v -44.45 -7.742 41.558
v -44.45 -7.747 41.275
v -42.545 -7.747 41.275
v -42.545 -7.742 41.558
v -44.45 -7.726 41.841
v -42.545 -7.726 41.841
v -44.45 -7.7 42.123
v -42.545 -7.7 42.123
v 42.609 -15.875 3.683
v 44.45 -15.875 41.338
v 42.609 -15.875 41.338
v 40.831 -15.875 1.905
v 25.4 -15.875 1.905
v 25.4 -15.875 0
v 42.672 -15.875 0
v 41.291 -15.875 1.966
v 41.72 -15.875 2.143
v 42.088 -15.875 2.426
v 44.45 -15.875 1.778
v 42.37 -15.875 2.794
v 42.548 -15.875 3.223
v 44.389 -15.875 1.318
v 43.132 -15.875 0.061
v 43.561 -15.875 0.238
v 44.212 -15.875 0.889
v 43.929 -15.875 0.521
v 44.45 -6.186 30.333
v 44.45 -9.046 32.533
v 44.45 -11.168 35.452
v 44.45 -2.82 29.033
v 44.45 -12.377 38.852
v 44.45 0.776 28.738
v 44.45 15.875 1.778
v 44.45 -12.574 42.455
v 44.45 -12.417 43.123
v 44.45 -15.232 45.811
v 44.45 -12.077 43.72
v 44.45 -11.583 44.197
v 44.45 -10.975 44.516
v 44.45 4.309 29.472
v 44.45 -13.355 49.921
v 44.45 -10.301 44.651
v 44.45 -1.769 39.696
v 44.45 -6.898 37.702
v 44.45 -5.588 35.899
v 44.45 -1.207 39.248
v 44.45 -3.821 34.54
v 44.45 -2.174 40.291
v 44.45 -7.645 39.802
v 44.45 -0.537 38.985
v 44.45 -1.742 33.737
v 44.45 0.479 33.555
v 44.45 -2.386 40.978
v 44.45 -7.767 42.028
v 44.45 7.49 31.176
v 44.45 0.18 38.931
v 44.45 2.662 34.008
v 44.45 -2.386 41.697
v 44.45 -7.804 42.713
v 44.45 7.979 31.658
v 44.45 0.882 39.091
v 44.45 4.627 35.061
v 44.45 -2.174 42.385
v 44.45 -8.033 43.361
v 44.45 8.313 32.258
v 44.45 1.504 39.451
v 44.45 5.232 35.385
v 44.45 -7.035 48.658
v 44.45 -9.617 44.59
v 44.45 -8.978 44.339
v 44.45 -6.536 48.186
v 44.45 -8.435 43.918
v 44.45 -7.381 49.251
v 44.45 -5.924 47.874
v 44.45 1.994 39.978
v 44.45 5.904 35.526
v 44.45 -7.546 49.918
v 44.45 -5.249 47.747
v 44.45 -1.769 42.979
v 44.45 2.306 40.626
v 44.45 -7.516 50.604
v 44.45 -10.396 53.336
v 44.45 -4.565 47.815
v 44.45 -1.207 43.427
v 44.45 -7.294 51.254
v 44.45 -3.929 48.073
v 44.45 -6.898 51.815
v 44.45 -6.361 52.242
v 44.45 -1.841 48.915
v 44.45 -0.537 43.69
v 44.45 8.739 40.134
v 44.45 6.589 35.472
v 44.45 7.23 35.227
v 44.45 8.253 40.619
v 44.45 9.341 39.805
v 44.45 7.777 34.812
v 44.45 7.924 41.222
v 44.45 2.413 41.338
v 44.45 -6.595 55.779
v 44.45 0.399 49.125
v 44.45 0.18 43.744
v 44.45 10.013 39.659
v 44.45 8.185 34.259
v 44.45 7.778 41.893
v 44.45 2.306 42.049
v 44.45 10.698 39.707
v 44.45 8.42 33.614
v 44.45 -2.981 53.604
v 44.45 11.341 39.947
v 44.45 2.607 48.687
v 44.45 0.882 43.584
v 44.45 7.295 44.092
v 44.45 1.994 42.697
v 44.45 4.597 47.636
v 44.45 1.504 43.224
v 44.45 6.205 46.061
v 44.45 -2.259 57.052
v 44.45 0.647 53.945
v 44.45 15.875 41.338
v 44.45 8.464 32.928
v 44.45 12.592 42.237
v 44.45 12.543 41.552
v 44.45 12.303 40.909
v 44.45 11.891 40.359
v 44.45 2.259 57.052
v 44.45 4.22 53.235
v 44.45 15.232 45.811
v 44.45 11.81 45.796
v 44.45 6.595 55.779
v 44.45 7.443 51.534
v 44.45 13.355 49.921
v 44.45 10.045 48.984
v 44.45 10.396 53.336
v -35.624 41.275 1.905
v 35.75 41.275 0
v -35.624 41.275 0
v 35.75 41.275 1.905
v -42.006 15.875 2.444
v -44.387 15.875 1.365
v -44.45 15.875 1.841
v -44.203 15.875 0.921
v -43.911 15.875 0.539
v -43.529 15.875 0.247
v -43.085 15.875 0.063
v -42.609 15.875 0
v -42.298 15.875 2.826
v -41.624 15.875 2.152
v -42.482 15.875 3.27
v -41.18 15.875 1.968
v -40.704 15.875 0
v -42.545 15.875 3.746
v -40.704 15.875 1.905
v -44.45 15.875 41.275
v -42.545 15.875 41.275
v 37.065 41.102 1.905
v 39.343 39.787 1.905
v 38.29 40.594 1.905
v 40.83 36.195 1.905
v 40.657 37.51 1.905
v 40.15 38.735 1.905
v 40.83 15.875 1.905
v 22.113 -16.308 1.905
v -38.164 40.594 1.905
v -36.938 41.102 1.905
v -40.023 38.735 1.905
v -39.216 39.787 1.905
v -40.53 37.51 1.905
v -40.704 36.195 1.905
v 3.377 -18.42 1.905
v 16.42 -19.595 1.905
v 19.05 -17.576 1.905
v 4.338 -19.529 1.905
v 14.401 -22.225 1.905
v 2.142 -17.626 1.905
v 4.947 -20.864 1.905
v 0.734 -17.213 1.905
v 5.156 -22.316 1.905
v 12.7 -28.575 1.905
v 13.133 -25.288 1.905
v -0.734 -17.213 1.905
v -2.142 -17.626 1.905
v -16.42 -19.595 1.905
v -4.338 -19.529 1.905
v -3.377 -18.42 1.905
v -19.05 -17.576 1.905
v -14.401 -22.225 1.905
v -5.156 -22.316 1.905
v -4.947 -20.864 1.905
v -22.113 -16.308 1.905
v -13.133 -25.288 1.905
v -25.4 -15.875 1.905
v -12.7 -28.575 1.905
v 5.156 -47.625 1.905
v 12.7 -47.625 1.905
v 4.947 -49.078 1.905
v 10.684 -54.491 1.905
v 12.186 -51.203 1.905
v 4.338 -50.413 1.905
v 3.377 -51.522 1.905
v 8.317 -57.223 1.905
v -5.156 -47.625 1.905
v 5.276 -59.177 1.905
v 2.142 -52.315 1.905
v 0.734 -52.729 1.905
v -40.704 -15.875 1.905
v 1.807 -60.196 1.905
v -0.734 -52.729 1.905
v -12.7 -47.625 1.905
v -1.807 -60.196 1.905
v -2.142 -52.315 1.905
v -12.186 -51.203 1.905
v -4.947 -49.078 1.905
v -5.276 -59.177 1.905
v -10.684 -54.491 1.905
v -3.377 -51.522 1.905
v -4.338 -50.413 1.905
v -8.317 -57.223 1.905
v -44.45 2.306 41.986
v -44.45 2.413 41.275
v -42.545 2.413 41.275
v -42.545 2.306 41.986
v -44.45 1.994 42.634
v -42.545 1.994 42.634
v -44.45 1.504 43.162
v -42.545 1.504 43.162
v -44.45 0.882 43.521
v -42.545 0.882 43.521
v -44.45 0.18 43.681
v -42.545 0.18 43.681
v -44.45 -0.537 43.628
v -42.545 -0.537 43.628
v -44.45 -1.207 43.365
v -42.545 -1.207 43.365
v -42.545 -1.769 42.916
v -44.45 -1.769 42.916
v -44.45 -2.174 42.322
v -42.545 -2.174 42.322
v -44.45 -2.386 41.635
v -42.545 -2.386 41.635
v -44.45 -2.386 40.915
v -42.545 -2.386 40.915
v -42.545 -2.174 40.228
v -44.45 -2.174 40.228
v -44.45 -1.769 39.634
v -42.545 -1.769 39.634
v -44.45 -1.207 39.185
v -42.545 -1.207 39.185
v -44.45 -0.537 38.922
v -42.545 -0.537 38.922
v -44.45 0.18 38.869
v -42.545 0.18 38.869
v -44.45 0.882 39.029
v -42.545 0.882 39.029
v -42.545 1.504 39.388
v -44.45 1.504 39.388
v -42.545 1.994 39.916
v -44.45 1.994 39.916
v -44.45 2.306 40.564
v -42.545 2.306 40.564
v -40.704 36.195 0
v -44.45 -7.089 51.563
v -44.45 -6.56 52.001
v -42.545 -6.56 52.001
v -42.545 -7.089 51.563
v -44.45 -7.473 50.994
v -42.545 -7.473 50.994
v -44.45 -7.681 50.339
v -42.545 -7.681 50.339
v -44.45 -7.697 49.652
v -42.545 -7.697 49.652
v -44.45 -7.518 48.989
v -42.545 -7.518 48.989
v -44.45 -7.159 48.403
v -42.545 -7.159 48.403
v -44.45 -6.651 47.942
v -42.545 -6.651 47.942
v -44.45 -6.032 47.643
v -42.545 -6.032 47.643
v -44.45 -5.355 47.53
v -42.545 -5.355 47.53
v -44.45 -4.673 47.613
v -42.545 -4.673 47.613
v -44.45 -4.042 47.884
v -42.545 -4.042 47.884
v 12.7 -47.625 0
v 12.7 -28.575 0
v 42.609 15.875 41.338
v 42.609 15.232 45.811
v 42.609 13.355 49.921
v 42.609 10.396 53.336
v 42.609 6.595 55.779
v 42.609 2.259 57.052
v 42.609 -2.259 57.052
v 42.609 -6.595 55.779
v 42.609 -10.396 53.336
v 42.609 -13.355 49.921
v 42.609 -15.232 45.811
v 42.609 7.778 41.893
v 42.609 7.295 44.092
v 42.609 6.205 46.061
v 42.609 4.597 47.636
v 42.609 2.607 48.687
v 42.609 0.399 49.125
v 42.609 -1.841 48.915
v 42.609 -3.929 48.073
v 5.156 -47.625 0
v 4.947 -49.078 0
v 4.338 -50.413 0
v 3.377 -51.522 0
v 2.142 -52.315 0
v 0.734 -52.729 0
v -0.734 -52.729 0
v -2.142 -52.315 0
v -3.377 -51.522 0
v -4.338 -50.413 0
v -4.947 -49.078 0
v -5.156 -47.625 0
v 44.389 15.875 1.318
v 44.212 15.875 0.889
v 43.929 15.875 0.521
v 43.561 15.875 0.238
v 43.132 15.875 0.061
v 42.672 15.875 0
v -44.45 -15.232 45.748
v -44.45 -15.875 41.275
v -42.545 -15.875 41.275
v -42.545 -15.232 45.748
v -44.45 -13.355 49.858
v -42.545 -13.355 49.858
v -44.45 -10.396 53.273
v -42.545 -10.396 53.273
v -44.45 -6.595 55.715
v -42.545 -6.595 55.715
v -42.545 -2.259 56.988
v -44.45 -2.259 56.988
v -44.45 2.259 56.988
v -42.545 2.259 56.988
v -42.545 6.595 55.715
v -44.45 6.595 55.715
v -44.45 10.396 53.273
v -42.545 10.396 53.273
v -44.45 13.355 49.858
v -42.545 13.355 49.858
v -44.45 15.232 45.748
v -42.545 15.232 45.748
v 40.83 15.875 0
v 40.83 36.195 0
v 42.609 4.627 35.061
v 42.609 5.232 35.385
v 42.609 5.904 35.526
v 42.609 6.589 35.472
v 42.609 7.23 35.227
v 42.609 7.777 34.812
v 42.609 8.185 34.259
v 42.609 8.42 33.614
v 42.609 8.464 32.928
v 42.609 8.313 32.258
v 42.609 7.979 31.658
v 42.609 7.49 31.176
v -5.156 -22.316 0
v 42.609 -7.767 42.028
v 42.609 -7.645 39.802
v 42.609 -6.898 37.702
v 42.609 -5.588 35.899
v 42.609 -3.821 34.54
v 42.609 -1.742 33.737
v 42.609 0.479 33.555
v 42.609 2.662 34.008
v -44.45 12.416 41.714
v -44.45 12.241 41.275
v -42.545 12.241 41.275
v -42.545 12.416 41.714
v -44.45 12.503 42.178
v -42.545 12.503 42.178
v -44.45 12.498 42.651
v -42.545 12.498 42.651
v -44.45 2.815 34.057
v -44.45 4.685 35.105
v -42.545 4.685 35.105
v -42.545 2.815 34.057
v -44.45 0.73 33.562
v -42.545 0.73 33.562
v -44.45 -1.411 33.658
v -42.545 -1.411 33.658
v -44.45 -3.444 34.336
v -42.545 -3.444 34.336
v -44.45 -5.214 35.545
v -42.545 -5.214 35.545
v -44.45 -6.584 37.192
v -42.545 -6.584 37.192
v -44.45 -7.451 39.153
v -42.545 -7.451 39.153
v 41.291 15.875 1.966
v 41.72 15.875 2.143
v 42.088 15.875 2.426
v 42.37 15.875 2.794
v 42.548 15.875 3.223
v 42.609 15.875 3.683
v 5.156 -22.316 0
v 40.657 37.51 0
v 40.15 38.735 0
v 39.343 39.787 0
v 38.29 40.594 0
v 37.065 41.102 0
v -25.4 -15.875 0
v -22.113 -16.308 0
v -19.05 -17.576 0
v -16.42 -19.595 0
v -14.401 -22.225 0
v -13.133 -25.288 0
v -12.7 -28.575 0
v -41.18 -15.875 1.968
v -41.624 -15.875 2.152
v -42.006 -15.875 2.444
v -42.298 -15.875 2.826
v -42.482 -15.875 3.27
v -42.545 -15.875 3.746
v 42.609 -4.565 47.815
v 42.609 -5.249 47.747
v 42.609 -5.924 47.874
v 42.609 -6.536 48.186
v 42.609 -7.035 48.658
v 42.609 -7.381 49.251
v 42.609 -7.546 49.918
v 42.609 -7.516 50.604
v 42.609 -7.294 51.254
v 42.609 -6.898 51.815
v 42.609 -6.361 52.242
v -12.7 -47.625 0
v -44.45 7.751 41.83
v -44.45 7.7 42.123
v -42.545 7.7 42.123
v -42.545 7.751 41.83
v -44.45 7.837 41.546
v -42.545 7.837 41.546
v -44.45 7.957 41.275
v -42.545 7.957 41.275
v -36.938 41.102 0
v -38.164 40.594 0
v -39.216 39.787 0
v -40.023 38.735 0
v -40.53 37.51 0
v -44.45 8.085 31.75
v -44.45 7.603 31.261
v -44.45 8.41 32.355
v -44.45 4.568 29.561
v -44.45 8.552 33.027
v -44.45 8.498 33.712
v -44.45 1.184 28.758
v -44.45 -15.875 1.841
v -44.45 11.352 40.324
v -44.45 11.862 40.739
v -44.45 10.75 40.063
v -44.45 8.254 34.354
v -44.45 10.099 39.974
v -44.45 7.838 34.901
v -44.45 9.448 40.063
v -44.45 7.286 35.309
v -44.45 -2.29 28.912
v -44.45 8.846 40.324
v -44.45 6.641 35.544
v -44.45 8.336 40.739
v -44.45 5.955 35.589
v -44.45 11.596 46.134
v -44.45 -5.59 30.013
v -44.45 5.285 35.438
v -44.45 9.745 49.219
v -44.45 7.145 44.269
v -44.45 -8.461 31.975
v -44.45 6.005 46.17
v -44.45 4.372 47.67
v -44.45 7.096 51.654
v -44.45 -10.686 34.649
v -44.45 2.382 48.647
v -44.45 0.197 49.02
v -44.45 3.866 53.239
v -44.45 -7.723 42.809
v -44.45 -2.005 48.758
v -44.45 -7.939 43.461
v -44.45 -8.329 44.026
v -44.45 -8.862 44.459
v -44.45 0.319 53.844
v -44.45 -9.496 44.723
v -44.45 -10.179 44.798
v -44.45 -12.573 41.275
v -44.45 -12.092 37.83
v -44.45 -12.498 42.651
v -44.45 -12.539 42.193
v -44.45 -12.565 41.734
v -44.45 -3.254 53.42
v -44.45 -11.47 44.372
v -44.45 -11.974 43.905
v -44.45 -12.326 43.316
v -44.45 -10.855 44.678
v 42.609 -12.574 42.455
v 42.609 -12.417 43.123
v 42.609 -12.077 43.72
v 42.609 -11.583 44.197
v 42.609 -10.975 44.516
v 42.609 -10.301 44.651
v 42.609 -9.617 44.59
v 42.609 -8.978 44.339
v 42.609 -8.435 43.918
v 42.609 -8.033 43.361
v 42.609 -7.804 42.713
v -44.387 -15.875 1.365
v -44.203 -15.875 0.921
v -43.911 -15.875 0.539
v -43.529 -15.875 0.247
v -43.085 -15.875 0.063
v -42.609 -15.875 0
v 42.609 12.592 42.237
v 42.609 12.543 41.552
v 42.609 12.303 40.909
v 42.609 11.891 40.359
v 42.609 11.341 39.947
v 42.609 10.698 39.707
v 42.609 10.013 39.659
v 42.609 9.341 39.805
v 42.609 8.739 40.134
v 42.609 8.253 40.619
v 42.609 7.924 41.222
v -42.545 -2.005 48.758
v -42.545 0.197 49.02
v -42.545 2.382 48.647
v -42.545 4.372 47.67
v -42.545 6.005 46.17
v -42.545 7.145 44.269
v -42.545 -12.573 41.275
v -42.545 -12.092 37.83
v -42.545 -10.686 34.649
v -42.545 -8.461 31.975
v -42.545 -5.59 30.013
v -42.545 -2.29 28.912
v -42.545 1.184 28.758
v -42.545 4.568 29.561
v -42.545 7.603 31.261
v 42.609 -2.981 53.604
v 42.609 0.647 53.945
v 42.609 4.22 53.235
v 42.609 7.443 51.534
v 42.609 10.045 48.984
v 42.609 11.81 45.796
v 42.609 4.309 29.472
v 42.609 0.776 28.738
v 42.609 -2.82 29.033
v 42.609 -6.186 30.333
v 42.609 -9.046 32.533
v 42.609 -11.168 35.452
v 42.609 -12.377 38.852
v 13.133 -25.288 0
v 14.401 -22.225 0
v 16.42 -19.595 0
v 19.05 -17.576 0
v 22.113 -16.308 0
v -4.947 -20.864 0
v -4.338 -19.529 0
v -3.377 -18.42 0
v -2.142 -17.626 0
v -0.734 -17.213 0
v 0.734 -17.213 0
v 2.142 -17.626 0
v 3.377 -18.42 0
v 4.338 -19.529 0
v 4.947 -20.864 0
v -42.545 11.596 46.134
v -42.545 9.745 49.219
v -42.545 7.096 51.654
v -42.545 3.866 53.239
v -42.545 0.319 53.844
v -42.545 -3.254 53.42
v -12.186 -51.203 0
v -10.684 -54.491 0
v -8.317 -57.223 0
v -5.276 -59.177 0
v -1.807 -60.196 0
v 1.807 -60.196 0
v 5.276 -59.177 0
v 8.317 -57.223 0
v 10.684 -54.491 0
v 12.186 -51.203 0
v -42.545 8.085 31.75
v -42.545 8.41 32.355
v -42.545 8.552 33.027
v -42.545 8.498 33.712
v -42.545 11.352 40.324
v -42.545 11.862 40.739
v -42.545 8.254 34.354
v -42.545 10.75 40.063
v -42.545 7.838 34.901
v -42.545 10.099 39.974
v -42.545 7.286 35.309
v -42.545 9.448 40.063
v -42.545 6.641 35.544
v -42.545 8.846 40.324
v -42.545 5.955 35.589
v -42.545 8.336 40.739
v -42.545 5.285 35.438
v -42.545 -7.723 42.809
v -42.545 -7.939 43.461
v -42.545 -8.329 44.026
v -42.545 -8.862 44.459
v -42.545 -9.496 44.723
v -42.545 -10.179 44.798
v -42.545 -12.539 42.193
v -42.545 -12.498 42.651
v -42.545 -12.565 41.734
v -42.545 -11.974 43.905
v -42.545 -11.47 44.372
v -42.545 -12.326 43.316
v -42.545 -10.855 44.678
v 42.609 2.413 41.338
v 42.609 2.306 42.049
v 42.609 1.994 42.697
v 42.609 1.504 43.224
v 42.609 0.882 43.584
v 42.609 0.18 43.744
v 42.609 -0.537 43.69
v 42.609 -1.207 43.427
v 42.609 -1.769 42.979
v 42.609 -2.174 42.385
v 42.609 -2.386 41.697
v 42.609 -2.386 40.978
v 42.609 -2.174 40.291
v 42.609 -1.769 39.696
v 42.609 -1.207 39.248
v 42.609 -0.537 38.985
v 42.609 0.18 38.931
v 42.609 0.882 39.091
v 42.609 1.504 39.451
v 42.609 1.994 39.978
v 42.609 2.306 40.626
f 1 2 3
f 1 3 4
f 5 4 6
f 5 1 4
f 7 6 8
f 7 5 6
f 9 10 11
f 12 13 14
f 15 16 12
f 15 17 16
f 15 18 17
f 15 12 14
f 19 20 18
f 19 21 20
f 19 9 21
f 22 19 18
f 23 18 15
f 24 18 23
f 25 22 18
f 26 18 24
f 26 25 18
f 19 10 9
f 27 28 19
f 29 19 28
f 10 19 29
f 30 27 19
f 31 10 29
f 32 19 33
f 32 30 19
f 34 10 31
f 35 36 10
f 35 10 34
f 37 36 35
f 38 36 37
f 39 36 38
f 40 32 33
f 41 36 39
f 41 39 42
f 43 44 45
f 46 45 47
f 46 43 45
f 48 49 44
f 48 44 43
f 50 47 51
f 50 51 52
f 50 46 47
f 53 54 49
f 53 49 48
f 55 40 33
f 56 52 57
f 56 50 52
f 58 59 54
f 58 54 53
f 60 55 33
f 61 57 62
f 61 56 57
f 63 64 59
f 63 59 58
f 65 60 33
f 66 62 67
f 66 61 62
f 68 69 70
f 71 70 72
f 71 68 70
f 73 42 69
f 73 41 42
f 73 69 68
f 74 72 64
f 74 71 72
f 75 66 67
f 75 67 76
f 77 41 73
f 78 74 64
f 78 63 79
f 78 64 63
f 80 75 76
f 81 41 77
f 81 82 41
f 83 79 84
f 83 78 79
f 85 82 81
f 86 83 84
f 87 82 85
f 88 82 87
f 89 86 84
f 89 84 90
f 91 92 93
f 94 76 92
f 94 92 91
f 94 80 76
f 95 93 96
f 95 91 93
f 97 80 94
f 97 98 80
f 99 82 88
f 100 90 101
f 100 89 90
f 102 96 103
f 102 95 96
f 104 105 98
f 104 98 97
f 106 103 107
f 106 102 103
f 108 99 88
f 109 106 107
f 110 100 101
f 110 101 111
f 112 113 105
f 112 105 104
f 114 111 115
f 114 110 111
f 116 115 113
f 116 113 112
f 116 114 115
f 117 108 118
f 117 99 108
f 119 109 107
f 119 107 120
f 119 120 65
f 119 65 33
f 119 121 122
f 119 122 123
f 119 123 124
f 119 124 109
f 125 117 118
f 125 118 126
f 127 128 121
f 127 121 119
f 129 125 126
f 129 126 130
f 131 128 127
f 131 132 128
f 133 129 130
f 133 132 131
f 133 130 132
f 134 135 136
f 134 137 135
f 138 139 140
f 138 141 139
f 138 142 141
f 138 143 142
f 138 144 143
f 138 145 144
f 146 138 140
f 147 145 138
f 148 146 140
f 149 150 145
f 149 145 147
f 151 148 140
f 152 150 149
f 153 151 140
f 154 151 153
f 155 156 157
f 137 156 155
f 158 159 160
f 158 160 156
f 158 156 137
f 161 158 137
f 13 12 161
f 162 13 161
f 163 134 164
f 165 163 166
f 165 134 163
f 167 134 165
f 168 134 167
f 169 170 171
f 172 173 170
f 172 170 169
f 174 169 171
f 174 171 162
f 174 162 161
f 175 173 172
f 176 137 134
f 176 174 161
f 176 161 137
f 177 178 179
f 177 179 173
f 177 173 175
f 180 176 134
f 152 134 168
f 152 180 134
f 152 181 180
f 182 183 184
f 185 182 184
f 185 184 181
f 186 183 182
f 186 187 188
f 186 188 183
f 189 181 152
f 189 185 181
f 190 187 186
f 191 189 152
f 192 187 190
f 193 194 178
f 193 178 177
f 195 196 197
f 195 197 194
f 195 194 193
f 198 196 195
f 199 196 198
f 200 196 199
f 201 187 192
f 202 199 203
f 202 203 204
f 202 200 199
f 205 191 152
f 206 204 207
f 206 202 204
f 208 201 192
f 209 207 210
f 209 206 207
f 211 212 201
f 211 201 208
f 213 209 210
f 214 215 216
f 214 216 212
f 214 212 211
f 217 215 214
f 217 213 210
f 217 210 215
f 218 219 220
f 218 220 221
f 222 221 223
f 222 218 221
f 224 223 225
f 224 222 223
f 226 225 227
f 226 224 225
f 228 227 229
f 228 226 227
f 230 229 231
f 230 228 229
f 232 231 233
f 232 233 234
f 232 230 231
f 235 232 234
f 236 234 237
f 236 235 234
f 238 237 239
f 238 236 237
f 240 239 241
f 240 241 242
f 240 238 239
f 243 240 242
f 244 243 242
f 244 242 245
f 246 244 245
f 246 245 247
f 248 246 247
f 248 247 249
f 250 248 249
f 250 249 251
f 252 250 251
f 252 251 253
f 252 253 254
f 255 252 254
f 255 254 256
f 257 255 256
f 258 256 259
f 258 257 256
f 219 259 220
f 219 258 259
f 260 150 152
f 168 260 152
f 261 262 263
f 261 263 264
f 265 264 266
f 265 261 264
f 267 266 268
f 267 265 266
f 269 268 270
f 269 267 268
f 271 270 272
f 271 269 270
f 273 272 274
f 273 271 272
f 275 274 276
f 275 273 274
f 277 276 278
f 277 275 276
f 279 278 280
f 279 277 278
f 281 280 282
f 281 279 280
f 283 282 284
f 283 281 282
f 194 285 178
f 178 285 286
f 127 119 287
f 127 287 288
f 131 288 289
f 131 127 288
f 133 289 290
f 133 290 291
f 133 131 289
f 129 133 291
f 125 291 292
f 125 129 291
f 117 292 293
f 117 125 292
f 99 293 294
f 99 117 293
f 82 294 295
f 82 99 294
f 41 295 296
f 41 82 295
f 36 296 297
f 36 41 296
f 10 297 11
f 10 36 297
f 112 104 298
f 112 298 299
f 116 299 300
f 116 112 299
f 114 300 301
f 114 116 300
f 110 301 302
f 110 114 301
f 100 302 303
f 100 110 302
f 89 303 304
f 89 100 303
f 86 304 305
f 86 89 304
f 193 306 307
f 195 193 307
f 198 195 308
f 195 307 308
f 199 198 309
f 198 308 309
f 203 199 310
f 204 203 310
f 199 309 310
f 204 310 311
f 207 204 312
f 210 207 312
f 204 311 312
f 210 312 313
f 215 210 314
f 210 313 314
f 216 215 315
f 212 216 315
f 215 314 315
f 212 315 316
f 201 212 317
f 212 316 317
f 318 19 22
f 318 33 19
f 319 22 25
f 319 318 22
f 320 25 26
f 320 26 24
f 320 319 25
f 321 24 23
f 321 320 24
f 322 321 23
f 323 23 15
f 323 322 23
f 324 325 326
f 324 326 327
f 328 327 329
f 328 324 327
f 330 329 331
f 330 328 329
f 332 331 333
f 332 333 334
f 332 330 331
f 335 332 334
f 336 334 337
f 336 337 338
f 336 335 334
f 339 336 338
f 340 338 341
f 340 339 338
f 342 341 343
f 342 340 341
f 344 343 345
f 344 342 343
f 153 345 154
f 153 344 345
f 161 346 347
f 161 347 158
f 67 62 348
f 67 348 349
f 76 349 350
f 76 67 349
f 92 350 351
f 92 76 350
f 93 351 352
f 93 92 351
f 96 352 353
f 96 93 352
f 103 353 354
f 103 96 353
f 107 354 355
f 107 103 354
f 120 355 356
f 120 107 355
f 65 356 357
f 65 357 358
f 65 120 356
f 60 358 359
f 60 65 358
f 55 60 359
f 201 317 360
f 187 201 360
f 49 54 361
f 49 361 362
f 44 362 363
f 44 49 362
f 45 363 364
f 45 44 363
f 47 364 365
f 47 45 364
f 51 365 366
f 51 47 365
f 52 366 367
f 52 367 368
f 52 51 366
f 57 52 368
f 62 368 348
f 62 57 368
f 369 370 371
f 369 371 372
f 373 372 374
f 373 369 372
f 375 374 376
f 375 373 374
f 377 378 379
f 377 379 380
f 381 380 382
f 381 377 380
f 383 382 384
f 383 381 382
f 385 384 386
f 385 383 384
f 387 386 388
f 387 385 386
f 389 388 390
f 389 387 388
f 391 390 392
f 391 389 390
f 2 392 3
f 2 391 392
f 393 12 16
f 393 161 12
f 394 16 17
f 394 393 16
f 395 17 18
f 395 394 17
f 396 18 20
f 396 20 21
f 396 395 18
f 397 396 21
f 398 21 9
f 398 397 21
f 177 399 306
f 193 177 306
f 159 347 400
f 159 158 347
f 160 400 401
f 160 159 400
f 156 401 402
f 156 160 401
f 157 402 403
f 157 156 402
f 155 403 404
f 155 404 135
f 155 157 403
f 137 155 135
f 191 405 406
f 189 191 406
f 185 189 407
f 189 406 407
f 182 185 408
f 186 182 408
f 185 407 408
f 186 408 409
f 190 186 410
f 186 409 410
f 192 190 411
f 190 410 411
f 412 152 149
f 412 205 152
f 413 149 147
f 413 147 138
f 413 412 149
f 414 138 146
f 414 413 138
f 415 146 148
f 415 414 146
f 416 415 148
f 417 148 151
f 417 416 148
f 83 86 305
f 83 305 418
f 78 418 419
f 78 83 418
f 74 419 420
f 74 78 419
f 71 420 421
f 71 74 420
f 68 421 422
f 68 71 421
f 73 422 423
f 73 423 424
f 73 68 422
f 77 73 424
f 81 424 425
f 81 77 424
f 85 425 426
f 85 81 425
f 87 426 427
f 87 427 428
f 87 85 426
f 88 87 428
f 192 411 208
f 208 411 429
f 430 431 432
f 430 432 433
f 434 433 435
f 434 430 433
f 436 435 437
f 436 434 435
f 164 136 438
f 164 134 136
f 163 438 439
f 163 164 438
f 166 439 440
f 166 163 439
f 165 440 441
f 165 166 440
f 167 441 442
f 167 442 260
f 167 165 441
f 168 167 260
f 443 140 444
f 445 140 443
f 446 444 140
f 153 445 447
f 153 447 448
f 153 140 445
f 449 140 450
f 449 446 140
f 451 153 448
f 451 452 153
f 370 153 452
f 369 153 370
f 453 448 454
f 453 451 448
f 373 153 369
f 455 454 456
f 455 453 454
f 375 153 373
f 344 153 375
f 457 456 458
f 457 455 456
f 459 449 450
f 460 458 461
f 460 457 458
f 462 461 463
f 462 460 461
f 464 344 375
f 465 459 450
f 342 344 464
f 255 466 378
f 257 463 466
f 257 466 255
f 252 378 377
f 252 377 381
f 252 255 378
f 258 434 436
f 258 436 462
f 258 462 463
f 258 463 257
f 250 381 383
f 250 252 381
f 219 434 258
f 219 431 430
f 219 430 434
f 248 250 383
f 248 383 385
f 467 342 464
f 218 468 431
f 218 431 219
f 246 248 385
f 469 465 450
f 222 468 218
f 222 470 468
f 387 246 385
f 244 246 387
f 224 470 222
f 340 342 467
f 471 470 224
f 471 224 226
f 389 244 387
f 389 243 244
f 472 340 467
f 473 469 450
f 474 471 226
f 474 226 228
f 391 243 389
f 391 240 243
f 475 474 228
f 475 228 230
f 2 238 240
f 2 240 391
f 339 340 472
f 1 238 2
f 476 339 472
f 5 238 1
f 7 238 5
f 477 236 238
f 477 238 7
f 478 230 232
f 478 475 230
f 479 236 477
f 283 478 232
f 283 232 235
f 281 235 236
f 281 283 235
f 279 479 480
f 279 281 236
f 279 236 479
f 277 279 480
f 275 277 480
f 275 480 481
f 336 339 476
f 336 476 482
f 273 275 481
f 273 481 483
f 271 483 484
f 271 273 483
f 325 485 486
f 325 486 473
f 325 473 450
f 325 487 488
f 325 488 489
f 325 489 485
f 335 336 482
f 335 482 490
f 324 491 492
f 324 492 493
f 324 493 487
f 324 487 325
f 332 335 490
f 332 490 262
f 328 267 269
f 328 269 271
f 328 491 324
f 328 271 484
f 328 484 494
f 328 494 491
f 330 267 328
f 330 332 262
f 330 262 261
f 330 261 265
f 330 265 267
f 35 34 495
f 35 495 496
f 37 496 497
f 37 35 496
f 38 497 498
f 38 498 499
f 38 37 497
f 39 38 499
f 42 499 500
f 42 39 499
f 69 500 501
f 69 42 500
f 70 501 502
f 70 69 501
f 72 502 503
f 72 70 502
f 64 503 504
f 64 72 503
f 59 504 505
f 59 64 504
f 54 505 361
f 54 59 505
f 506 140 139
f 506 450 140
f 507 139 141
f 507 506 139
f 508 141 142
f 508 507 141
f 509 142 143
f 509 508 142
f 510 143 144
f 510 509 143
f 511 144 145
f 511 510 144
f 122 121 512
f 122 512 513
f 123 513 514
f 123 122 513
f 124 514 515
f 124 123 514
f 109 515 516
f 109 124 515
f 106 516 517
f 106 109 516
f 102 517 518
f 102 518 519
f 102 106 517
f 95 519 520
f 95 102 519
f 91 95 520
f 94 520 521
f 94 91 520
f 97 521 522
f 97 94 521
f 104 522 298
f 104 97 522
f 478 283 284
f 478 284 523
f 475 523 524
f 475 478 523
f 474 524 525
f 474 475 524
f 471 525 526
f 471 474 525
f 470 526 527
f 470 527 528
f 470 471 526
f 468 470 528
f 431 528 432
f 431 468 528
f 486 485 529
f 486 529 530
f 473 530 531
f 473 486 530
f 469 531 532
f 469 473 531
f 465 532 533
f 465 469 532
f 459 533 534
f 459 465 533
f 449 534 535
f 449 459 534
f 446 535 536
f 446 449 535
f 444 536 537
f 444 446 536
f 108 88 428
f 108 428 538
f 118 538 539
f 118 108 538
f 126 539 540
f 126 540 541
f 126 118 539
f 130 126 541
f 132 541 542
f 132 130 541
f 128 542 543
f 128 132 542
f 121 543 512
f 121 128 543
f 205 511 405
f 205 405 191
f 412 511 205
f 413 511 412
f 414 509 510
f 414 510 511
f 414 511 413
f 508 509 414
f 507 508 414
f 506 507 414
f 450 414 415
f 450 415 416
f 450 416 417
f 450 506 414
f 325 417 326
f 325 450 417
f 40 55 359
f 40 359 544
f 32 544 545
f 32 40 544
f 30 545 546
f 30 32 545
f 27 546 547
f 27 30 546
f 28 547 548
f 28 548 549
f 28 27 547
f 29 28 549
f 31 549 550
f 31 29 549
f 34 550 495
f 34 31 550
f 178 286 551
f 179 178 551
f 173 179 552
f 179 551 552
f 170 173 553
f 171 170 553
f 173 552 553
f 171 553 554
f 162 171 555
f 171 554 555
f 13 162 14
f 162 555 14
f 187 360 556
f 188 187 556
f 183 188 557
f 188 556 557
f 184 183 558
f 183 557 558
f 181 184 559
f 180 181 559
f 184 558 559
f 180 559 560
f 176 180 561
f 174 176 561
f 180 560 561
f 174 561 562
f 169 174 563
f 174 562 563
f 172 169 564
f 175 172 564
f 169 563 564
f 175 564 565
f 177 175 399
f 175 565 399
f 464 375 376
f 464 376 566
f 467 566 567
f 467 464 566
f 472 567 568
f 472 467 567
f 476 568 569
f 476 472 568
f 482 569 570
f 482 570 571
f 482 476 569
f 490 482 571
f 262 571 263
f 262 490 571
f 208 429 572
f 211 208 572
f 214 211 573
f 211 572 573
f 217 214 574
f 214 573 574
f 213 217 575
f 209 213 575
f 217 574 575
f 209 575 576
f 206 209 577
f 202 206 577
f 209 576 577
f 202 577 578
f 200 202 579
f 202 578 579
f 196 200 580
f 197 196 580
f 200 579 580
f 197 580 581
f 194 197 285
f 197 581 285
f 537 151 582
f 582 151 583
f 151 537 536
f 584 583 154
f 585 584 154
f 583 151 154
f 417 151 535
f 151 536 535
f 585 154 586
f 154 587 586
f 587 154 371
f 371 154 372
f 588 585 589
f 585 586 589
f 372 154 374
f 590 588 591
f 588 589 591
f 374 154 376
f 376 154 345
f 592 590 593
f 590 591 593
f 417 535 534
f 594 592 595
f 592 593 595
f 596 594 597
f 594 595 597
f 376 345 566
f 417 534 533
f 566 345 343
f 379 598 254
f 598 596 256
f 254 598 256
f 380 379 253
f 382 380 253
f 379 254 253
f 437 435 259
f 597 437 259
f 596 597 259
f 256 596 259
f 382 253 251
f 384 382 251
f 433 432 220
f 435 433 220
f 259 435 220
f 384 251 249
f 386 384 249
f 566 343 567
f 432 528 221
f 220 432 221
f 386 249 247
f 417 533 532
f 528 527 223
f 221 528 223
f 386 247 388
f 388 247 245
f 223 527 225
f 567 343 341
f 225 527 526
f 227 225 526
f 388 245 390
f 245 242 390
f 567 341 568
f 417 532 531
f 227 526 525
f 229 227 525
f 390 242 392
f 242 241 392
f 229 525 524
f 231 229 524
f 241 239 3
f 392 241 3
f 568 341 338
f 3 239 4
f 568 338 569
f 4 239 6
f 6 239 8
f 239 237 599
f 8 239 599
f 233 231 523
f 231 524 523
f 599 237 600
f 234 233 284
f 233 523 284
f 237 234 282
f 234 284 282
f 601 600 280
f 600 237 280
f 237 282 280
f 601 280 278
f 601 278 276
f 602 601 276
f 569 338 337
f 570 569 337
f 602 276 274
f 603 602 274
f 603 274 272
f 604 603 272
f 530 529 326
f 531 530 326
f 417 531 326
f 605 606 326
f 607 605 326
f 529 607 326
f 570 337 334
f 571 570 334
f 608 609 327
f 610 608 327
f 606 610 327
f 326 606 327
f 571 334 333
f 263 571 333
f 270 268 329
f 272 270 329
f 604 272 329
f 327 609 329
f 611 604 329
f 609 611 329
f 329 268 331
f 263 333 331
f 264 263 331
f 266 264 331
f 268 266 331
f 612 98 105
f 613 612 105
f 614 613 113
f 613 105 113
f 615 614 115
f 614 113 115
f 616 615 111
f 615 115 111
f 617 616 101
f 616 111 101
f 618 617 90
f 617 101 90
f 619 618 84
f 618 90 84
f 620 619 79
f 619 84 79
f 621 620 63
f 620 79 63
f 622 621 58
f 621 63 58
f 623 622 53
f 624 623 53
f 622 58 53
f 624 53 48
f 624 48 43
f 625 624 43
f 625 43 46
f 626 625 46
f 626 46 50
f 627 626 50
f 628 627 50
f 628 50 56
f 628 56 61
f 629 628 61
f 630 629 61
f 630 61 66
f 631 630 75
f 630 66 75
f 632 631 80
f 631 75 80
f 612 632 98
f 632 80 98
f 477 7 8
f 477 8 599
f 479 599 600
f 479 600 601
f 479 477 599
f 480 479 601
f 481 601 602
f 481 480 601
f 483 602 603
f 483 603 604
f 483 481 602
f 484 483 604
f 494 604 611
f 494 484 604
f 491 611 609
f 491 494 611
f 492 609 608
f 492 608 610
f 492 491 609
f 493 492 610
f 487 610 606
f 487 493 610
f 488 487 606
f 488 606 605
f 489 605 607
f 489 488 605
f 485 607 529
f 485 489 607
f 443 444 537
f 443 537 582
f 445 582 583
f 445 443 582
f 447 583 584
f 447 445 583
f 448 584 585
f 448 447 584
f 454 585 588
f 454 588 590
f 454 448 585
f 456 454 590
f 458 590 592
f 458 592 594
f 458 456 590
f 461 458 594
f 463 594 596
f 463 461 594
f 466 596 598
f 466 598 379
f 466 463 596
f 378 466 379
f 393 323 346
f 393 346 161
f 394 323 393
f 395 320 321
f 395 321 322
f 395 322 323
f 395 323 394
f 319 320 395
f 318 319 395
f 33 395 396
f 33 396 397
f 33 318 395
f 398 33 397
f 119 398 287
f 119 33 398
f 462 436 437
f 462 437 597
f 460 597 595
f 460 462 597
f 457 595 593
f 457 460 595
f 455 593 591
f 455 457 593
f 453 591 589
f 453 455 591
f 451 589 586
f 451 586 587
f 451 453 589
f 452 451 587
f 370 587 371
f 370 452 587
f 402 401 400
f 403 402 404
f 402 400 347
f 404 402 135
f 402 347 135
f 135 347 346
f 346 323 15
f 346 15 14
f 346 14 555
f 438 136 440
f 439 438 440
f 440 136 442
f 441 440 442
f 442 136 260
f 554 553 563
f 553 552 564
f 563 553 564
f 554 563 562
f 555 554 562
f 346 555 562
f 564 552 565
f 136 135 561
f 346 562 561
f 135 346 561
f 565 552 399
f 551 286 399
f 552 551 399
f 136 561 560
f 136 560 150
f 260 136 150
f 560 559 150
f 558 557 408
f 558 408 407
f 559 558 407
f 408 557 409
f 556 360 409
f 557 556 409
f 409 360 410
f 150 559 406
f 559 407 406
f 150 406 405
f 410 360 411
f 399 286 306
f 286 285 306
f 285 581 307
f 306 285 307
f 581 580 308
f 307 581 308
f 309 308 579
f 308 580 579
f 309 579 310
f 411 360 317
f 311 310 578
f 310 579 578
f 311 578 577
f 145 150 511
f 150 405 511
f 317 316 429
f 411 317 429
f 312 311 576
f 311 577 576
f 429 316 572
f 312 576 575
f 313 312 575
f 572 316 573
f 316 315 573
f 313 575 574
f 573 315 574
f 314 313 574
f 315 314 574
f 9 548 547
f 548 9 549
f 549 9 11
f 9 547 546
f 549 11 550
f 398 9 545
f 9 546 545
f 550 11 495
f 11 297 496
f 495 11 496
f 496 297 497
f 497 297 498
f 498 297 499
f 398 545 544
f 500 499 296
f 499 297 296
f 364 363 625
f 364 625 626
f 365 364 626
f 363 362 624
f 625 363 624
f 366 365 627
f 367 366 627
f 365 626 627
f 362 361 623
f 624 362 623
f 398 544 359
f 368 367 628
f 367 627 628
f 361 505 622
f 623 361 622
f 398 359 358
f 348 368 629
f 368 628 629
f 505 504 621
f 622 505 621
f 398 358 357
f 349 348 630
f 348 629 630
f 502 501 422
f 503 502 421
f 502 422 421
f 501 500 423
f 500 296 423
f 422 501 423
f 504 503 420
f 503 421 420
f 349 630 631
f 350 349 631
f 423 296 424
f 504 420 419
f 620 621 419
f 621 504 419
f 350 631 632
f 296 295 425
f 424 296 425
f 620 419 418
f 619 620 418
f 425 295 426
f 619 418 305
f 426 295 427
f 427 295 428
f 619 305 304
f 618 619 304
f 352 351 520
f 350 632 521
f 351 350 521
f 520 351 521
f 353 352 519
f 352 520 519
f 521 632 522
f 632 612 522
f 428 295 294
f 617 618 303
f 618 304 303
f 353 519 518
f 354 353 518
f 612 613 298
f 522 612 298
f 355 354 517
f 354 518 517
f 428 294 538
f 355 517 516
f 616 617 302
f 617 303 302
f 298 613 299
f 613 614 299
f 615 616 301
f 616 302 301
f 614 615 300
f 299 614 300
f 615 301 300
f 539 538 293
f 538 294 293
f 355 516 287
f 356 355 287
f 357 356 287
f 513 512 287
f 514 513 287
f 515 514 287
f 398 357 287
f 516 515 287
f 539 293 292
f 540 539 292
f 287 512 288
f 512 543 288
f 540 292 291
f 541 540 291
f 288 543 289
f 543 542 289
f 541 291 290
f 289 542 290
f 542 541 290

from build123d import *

# Parameters (mm, degrees)
F1_DEPTH = 1.905
F3_DEPTH = 1.905
F4_R     = 1.8415
F5_R     = 2.413
F6_DEPTH = 1.8415
F7_R     = 1.778
F8_W     = 81.534
F8_H     = 1.905
F9_DEPTH = 25.4
F10_R    = 5.08


with BuildPart() as f1:
    # F0 (on Top) → F1 (new body)
    with BuildSketch(Plane.XY):
        with BuildLine():
            Line((44.45, -15.875), (44.45, 15.875))
            Line((44.45, 15.875), (-44.45, 15.875))
            Line((-44.45, 15.875), (-44.45, -15.875))
            Line((-44.45, -15.875), (-25.4, -15.875))
            ThreePointArc((-25.4, -15.875), (-16.4197438789, -19.5947438789), (-12.7, -28.575))
            Line((-12.7, -28.575), (-12.7, -47.625))
            ThreePointArc((-12.7, -47.625), (0, -60.325), (12.7, -47.625))
            Line((12.7, -47.625), (12.7, -28.575))
            ThreePointArc((12.7, -28.575), (16.4197438789, -19.5947438789), (25.4, -15.875))
            Line((25.4, -15.875), (44.45, -15.875))
        make_face()
        with BuildLine():
            Line((5.1562, -22.3163515329), (5.1562, -47.625))
            ThreePointArc((5.1562, -47.625), (0, -52.7812), (-5.1562, -47.625))
            Line((-5.1562, -47.625), (-5.1562, -22.3163515329))
            ThreePointArc((-5.1562, -22.3163515329), (0, -17.1601515329), (5.1562, -22.3163515329))
        make_face(mode=Mode.SUBTRACT)
    extrude(amount=F1_DEPTH)

    # F2 (on face) → F3 (join)
    with BuildSketch(Plane(origin=(-44.45, 0, 0), x_dir=(0, -1, 0), z_dir=(-1, 0, 0))):
        with BuildLine():
            Line((-15.875, 41.275), (-15.875, 1.905))
            Line((-15.875, 1.905), (15.875, 1.905))
            Line((15.875, 1.905), (15.875, 41.275))
            Line((15.875, 41.275), (12.573, 41.275))
            ThreePointArc((12.573, 41.275), (5.5897728619, 30.0129056853), (-7.6027366345, 31.2610734641))
            ThreePointArc((-7.6027366345, 31.2610734641), (-8.0654902519, 34.6420492241), (-4.6845144919, 35.1048028415))
            ThreePointArc((-4.6845144919, 35.1048028415), (3.4442034806, 34.3357297657), (7.747, 41.275))
            Line((7.747, 41.275), (2.413, 41.275))
            ThreePointArc((2.413, 41.275), (0, 38.862), (-2.413, 41.275))
            Line((-2.413, 41.275), (-7.9572815939, 41.275))
            ThreePointArc((-7.9572815939, 41.275), (-10.0990117962, 39.9735577991), (-12.2407419985, 41.275))
            Line((-12.2407419985, 41.275), (-15.875, 41.275))
        make_face()
        with BuildLine():
            ThreePointArc((15.875, 41.275), (0, 57.15), (-15.875, 41.275))
            Line((-15.875, 41.275), (-12.2407419985, 41.275))
            ThreePointArc((-12.2407419985, 41.275), (-12.4710349135, 41.9437538571), (-12.4975270978, 42.6505527763))
            ThreePointArc((-12.4975270978, 42.6505527763), (-5.5381580453, 52.56256548), (6.5600004581, 52.0009835442))
            ThreePointArc((6.5600004581, 52.0009835442), (7.3595325655, 48.6834714629), (4.0420204843, 47.8839393555))
            ThreePointArc((4.0420204843, 47.8839393555), (-3.4124004118, 48.2299645887), (-7.7004964946, 42.1225628218))
            ThreePointArc((-7.7004964946, 42.1225628218), (-7.7896724982, 41.6869000206), (-7.9572815939, 41.275))
            Line((-7.9572815939, 41.275), (-2.413, 41.275))
            ThreePointArc((-2.413, 41.275), (0, 43.688), (2.413, 41.275))
            Line((2.413, 41.275), (7.747, 41.275))
            ThreePointArc((7.747, 41.275), (7.7353653871, 41.6994188123), (7.7004964946, 42.1225628218))
            ThreePointArc((7.7004964946, 42.1225628218), (9.8350168189, 44.7850731007), (12.4975270978, 42.6505527763))
            ThreePointArc((12.4975270978, 42.6505527763), (12.5541175954, 41.9638108593), (12.573, 41.275))
            Line((12.573, 41.275), (15.875, 41.275))
        make_face()
    extrude(amount=-F3_DEPTH)

    # F4
    f4_edges = [f1.edges().sort_by_distance(p)[0] for p in [
        (-44.45, 0, 0),
        (-42.545, 0, 1.905),
    ]]
    fillet(f4_edges, radius=F4_R)

    # F5 (on face) → F6 (join)
    with BuildSketch(Plane.YZ.offset(44.45)):
        with BuildLine():
            Line((-15.875, 41.3385), (-15.875, 1.905))
            Line((-15.875, 1.905), (-15.875, 0))
            Line((-15.875, 0), (15.875, 0))
            Line((15.875, 0), (15.875, 1.905))
            Line((15.875, 1.905), (15.875, 41.3385))
            ThreePointArc((15.875, 41.3385), (0, 57.2135), (-15.875, 41.3385))
        make_face()
        with BuildLine():
            ThreePointArc((-7.7672171262, 42.0276193774), (-3.8210671013, 34.5402395867), (4.6265424964, 35.0606704009))
            ThreePointArc((4.6265424964, 35.0606704009), (8.0006043661, 34.5499410208), (7.4898749861, 31.1758791512))
            ThreePointArc((7.4898749861, 31.1758791512), (-6.1858969034, 30.3333576051), (-12.5742896147, 42.4546206538))
            ThreePointArc((-12.5742896147, 42.4546206538), (-9.9572527322, 44.6446562598), (-7.7672171262, 42.0276193774))
        make_face(mode=Mode.SUBTRACT)
        with Locations((0, 41.3376752096)):
            Circle(F5_R, mode=Mode.SUBTRACT)
        with BuildLine():
            ThreePointArc((-6.3605039749, 52.2420007561), (5.8932381714, 52.5014590796), (12.591700736, 42.2373412666))
            ThreePointArc((12.591700736, 42.2373412666), (10.3568047712, 39.6585085798), (7.7779720844, 41.8934045446))
            ThreePointArc((7.7779720844, 41.8934045446), (3.6402899771, 48.2336141393), (-3.9289229785, 48.0733451146))
            ThreePointArc((-3.9289229785, 48.0733451146), (-7.2290412974, 48.9418824372), (-6.3605039749, 52.2420007561))
        make_face(mode=Mode.SUBTRACT)
    extrude(amount=-F6_DEPTH)

    # F7
    f7_edges = [f1.edges().sort_by_distance(p)[0] for p in [
        (44.45, 0, 0),
        (42.6085, 0, 1.905),
    ]]
    fillet(f7_edges, radius=F7_R)

    # F8 (on face) → F9 (join)
    with BuildSketch(Plane(origin=(0, 15.875, 0), x_dir=(-1, 0, 0), z_dir=(0, 1, 0))):
        with Locations((-0.0635, 0.9525)):
            Rectangle(F8_W, F8_H)
    extrude(amount=F9_DEPTH)

    # F10
    f10_edges = [f1.edges().sort_by_distance(p)[0] for p in [
        (40.8305, 41.275, 0.9525),
        (-40.7035, 41.275, 0.9525),
    ]]
    fillet(f10_edges, radius=F10_R)


solid = f1.part
